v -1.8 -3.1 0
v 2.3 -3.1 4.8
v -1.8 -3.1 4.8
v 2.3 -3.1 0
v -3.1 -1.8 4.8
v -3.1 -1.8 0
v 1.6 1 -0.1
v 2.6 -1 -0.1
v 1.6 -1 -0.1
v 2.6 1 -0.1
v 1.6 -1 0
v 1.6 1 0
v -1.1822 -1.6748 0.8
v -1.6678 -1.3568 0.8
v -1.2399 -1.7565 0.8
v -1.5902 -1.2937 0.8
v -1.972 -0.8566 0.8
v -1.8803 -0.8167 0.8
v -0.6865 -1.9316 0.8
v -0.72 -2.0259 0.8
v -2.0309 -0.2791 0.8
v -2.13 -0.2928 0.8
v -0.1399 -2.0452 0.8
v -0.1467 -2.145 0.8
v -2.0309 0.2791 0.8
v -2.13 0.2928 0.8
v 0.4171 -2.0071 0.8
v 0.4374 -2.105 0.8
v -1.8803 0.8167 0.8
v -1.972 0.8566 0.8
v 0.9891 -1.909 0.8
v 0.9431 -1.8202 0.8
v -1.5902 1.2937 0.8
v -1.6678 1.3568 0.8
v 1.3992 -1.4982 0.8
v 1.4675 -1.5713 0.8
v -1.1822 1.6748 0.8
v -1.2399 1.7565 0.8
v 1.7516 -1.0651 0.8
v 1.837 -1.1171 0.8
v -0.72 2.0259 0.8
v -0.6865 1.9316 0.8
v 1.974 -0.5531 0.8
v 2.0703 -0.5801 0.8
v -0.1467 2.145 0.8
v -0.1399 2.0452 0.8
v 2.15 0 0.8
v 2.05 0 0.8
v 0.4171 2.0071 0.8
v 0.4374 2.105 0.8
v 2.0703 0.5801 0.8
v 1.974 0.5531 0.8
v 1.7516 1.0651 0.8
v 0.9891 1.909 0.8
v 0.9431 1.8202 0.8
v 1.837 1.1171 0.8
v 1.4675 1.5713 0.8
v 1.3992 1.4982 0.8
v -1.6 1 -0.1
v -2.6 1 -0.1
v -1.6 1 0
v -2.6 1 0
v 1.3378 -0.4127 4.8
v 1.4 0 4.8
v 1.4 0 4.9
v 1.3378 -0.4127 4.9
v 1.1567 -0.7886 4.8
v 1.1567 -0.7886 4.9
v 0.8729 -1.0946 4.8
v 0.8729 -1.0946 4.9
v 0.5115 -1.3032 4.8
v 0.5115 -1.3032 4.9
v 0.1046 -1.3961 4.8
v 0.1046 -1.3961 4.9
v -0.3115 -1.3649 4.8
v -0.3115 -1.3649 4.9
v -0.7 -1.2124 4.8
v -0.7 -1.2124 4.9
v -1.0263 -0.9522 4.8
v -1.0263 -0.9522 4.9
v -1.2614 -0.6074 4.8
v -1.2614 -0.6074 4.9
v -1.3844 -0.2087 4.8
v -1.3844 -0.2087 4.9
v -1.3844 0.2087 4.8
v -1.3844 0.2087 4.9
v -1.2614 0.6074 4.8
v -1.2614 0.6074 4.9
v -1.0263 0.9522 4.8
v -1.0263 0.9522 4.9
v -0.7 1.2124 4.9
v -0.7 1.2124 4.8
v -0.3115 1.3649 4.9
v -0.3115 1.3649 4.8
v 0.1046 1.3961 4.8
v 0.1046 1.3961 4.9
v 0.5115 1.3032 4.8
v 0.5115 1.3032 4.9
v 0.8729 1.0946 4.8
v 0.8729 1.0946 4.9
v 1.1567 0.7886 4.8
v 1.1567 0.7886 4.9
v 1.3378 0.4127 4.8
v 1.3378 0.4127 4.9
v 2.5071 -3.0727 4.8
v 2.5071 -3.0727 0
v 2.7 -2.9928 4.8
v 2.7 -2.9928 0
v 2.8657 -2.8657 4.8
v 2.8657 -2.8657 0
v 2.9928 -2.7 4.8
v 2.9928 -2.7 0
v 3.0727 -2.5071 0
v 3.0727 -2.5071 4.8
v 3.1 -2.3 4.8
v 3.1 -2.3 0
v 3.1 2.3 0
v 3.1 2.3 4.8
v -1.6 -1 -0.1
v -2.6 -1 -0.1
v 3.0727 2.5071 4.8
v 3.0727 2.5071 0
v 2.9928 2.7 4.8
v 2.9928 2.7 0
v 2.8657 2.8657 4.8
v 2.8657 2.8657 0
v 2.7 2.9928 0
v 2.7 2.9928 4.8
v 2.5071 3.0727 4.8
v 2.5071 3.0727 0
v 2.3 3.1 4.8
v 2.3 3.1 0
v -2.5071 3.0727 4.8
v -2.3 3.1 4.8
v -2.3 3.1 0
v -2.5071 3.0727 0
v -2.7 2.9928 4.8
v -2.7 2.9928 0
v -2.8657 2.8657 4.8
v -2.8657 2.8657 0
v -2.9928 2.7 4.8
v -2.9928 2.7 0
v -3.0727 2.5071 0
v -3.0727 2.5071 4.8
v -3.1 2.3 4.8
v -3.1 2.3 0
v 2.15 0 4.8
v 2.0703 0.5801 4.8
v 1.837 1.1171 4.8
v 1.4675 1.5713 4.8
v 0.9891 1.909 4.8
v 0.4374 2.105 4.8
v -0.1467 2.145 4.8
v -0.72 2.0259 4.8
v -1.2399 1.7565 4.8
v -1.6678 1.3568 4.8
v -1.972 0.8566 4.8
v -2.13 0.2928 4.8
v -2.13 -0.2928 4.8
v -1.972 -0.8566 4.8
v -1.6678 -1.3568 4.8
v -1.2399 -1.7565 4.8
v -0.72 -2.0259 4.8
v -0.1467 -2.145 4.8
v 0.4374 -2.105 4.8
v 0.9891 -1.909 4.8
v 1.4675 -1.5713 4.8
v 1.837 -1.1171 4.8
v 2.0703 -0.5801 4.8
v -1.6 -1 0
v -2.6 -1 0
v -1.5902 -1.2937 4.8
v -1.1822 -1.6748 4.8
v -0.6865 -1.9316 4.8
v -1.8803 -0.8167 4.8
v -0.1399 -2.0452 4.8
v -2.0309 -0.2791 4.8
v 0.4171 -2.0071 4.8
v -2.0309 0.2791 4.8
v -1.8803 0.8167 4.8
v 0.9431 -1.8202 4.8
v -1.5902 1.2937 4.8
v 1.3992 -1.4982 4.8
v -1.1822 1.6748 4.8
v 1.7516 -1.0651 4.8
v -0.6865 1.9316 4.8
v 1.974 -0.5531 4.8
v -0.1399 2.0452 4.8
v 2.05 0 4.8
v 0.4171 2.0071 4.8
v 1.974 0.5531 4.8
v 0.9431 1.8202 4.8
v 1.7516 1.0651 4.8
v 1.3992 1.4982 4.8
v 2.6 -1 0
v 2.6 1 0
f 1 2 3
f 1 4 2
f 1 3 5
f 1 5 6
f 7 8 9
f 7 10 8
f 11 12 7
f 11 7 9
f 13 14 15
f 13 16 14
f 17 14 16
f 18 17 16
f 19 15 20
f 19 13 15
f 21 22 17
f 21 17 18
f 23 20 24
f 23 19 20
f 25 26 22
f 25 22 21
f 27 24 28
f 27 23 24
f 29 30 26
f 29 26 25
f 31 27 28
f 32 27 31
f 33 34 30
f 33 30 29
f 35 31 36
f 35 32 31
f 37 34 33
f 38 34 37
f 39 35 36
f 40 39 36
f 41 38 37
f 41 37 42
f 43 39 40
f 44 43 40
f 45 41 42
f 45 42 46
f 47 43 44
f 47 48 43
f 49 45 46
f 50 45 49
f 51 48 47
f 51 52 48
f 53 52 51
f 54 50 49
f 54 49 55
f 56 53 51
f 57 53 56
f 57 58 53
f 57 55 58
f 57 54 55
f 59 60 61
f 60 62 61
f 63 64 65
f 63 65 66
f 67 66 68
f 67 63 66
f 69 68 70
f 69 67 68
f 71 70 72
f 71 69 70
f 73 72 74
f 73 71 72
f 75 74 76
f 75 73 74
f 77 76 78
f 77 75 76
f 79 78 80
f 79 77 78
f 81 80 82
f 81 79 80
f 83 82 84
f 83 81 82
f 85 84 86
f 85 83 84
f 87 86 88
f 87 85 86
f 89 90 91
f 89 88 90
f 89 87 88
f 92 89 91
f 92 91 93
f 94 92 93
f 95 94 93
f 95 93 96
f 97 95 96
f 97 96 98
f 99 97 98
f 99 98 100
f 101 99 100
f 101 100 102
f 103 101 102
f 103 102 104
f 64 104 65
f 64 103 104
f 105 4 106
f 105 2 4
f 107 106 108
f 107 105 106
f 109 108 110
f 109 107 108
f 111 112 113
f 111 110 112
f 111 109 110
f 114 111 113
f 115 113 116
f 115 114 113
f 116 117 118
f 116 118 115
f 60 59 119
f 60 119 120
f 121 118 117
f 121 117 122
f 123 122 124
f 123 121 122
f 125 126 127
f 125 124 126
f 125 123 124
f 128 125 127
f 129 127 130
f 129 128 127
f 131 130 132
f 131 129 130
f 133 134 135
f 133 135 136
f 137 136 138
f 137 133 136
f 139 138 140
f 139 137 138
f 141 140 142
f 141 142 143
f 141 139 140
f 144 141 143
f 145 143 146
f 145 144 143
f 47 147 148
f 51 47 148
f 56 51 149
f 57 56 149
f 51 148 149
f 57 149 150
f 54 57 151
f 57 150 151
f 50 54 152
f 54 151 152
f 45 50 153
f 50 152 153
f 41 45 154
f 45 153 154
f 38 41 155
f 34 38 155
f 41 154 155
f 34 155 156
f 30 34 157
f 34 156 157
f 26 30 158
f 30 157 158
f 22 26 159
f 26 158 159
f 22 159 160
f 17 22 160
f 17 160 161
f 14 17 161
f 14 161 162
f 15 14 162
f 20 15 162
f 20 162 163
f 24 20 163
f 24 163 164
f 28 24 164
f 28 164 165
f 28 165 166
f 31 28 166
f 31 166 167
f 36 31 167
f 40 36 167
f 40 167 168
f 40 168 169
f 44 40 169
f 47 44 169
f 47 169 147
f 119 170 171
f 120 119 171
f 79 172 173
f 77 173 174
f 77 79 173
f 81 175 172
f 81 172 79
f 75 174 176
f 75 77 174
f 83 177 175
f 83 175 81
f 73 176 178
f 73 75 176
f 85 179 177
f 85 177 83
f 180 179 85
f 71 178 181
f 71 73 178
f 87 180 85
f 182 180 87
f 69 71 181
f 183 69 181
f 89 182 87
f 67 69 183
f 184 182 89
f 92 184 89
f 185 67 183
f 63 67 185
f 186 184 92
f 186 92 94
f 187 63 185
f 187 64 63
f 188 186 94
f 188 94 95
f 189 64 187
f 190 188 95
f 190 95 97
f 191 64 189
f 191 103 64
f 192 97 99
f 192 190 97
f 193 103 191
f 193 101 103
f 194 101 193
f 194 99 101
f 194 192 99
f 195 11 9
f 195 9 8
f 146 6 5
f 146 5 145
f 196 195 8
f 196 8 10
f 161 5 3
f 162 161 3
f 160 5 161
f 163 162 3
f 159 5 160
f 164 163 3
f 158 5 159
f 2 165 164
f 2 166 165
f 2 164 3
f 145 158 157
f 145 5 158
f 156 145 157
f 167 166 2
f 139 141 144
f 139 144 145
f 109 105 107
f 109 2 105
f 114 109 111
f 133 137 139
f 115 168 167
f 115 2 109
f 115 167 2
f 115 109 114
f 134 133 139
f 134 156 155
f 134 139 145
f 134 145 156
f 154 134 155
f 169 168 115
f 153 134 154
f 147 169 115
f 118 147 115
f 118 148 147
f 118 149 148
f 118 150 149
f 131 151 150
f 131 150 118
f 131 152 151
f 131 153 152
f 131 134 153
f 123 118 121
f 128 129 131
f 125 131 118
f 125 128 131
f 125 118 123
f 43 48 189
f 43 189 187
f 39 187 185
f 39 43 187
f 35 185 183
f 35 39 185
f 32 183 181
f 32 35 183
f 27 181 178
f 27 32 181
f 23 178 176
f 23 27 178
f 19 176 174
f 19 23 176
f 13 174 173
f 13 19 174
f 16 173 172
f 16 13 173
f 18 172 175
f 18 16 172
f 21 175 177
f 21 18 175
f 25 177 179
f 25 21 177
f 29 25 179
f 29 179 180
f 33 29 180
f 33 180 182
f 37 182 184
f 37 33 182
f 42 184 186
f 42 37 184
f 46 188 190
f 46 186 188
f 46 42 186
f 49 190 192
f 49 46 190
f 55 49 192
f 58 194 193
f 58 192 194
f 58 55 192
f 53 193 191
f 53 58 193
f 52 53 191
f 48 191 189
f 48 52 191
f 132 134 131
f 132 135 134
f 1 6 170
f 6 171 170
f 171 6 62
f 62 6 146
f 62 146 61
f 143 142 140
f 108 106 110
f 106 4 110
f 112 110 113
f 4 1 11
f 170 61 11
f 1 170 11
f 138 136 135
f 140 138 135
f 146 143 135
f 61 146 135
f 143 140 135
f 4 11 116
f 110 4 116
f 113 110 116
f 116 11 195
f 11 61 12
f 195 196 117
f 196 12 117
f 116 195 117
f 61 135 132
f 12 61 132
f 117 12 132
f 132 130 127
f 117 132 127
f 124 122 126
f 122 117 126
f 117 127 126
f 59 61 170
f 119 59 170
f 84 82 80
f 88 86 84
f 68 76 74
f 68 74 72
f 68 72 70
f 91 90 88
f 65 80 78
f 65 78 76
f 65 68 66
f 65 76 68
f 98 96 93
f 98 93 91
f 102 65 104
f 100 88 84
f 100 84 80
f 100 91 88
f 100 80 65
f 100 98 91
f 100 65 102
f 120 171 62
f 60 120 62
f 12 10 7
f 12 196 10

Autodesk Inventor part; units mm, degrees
ref_plane "YZ Plane" through (0, 0, 0) normal (1, 0, 0) x (0, 1, 0)
ref_plane "XZ Plane" through (0, 0, 0) normal (0, 1, 0) x (-1, 0, 0)
ref_plane "XY Plane" through (0, 0, 0) normal (0, 0, 1) x (1, 0, 0)
sketch "Эскиз1" plane through (0, 0, 0) normal (0, 0, 1) x (1, 0, 0)
  line L0 (-3.1, 3.1) -> (3.1, 3.1)
  line L1 (3.1, 3.1) -> (3.1, -3.1)
  line L2 (3.1, -3.1) -> (-3.1, -3.1)
  line L3 (-3.1, -3.1) -> (-3.1, 3.1)
  line L4 (-3.1, 3.1) -> (3.1, -3.1) construction
  line L5 (3.1, 3.1) -> (-3.1, -3.1) construction
  point P0 (0, 0)
  dimension "d0" = 6.2
  dimension "d1" = 6.2
extrude "Выдавливание1" add sketch "Эскиз1" along normal blind 4.8
fillet "Сопряжение1" radius 0.8 3 edges at (3.1, 3.1, 2.4) (3.1, -3.1, 2.4) (-3.1, 3.1, 2.4)
chamfer "Фаска1" distance 1.3 angle 45 1 edges at (-3.1, -3.1, 2.4)
sketch "Эскиз2" plane through (0, 0, 4.8) normal (0, 0, 1) x (1, 0, 0)
  circle A0 centre (0, 0) radius 2.05
  circle A1 centre (0, 0) radius 2.15
  dimension "d9" = 4.3
extrude "Выдавливание2" cut sketch "Эскиз2" against normal blind 4 contours A0 | A1
sketch "Эскиз3" plane through (0, 0, 0.8) normal (0, 0, 1) x (1, 0, 0)
  circle A0 centre (0, 0) radius 2.05
  dimension "d12" = 4.1
extrude "Выдавливание3" add sketch "Эскиз3" along normal blind 4
sketch "Эскиз4" plane through (0, 0, 4.8) normal (0, 0, 1) x (1, 0, 0)
  circle A0 centre (0, 0) radius 1.4
  dimension "d15" = 2.8
extrude "Выдавливание4" add sketch "Эскиз4" along normal blind 0.1
sketch "Эскиз5" plane through (0, 0, 0) normal (0, 0, -1) x (-1, 0, 0)
  line L0 (-1.6, -1) -> (-2.6, -1)
  line L1 (-2.6, -1) -> (-2.6, 1)
  line L2 (-2.6, 1) -> (-1.6, 1)
  line L3 (-1.6, 1) -> (-1.6, -1)
  line L4 (-1.6, -1) -> (-2.6, 1) construction
  line L5 (-2.6, -1) -> (-1.6, 1) construction
  line L6 (1.6, -1) -> (2.6, -1)
  line L7 (2.6, -1) -> (2.6, 1)
  line L8 (2.6, 1) -> (1.6, 1)
  line L9 (1.6, 1) -> (1.6, -1)
  line L10 (1.6, -1) -> (2.6, 1) construction
  line L11 (2.6, -1) -> (1.6, 1) construction
  point P0 (0, 0)
  dimension "d28" = 1
  dimension "d29" = 2
  dimension "d31" = 1
  dimension "d32" = 2
extrude "Выдавливание5" add sketch "Эскиз5" along normal blind 0.1
